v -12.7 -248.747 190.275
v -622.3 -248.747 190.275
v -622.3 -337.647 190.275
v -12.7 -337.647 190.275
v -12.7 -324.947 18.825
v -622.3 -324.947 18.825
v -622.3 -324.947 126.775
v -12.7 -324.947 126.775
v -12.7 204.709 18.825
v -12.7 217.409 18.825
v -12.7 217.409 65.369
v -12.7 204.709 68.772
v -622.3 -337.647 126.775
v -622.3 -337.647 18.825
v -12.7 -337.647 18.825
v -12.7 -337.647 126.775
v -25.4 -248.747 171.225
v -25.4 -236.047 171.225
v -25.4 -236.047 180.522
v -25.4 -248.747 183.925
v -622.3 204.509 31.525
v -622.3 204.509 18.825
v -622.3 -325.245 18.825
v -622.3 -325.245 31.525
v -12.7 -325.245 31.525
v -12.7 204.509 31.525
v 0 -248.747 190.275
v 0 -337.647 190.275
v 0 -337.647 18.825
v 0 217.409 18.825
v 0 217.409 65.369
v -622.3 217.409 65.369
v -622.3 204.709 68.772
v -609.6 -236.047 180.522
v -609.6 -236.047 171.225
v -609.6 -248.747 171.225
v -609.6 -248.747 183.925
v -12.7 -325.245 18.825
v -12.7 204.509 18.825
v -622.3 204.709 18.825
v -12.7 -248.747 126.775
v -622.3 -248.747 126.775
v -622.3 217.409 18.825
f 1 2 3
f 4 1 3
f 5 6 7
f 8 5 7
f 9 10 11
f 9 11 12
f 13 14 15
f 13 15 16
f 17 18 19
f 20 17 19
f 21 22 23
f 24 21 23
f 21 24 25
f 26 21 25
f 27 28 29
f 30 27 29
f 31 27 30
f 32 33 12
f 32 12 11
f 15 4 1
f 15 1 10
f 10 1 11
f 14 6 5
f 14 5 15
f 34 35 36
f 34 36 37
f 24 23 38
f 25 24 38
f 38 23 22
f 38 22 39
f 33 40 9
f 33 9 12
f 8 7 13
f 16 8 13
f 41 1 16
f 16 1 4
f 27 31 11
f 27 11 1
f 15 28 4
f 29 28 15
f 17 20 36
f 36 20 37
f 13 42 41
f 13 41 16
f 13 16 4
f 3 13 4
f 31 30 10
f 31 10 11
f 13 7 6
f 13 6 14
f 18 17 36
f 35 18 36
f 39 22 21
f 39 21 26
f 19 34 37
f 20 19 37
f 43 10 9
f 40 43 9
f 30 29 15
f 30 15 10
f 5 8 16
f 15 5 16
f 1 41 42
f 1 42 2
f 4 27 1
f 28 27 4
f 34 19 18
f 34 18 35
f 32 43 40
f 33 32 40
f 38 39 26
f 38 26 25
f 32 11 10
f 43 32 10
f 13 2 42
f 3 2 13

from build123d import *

# Parameters (mm, degrees)
F1_DEPTH  = 12.7
F3_DEPTH  = 609.6
F4_W      = 88.9
F4_H      = 63.5
F5_DEPTH  = 609.6
F6_W      = 12.7
F6_H      = 107.95
F7_DEPTH  = 609.6
F8_W      = 609.6
F8_H      = 529.7542
F9_DEPTH  = 12.7
F10_W     = 584.2
F10_H     = 12.7
F11_DEPTH = 12.7
F13_DEPTH = 584.2


with BuildPart() as f1:
    # F0 (on Right) → F1 (new body)
    with BuildSketch(Plane.YZ):
        Polygon((-337.647018, 18.824673), (217.408786, 18.824673), (217.408786, 65.368602), (-248.747018, 190.274673), (-337.647018, 190.274673), align=None)
    extrude(amount=-F1_DEPTH)


with BuildPart() as f3:
    # F2 (on face) → F3 (new body)
    with BuildSketch(Plane(origin=(-12.7, 0, 0), x_dir=(0, -1, 0), z_dir=(-1, 0, 0))):
        Polygon((-217.408786, 65.368602), (-217.408786, 18.824673), (-204.708786, 18.824673), (-204.708786, 68.771557), align=None)
    extrude(amount=F3_DEPTH)


with BuildPart() as f5:
    # F4 (on face) → F5 (new body)
    with BuildSketch(Plane(origin=(-12.7, 0, 0), x_dir=(0, -1, 0), z_dir=(-1, 0, 0))):
        with Locations((293.197018, 158.524673)):
            Rectangle(F4_W, F4_H)
    extrude(amount=F5_DEPTH)


with BuildPart() as f7:
    # F6 (on face) → F7 (new body)
    with BuildSketch(Plane(origin=(-12.7, 0, 0), x_dir=(0, -1, 0), z_dir=(-1, 0, 0))):
        with Locations((331.297018, 72.799673)):
            Rectangle(F6_W, F6_H)
    extrude(amount=F7_DEPTH)


with BuildPart() as f9:
    # F8 (on face) → F9 (new body)
    with BuildSketch(Plane(origin=(0, 0, 18.824673), x_dir=(1, 0, 0), z_dir=(0, 0, -1))):
        with Locations((-317.5, 60.36831)):
            Rectangle(F8_W, F8_H)
    extrude(amount=-F9_DEPTH)


with BuildPart() as f11:
    # F10 (on face) → F11 (new body)
    with BuildSketch(Plane(origin=(0, -248.747018, 0), x_dir=(-1, 0, 0), z_dir=(0, 1, 0))):
        with Locations((317.5, 177.574673)):
            Rectangle(F10_W, F10_H)
    extrude(amount=F11_DEPTH)

    # F12 (on face) → F13 (cut, through all)
    with BuildSketch(Plane(origin=(-609.6, 0, 0), x_dir=(0, -1, 0), z_dir=(-1, 0, 0))):
        Polygon((236.047018, 180.521719), (248.747018, 183.924673), (236.047018, 183.924673), align=None)
    extrude(amount=-F13_DEPTH, mode=Mode.SUBTRACT)


solid = Compound([f1.part, f3.part, f5.part, f7.part, f9.part, f11.part])
